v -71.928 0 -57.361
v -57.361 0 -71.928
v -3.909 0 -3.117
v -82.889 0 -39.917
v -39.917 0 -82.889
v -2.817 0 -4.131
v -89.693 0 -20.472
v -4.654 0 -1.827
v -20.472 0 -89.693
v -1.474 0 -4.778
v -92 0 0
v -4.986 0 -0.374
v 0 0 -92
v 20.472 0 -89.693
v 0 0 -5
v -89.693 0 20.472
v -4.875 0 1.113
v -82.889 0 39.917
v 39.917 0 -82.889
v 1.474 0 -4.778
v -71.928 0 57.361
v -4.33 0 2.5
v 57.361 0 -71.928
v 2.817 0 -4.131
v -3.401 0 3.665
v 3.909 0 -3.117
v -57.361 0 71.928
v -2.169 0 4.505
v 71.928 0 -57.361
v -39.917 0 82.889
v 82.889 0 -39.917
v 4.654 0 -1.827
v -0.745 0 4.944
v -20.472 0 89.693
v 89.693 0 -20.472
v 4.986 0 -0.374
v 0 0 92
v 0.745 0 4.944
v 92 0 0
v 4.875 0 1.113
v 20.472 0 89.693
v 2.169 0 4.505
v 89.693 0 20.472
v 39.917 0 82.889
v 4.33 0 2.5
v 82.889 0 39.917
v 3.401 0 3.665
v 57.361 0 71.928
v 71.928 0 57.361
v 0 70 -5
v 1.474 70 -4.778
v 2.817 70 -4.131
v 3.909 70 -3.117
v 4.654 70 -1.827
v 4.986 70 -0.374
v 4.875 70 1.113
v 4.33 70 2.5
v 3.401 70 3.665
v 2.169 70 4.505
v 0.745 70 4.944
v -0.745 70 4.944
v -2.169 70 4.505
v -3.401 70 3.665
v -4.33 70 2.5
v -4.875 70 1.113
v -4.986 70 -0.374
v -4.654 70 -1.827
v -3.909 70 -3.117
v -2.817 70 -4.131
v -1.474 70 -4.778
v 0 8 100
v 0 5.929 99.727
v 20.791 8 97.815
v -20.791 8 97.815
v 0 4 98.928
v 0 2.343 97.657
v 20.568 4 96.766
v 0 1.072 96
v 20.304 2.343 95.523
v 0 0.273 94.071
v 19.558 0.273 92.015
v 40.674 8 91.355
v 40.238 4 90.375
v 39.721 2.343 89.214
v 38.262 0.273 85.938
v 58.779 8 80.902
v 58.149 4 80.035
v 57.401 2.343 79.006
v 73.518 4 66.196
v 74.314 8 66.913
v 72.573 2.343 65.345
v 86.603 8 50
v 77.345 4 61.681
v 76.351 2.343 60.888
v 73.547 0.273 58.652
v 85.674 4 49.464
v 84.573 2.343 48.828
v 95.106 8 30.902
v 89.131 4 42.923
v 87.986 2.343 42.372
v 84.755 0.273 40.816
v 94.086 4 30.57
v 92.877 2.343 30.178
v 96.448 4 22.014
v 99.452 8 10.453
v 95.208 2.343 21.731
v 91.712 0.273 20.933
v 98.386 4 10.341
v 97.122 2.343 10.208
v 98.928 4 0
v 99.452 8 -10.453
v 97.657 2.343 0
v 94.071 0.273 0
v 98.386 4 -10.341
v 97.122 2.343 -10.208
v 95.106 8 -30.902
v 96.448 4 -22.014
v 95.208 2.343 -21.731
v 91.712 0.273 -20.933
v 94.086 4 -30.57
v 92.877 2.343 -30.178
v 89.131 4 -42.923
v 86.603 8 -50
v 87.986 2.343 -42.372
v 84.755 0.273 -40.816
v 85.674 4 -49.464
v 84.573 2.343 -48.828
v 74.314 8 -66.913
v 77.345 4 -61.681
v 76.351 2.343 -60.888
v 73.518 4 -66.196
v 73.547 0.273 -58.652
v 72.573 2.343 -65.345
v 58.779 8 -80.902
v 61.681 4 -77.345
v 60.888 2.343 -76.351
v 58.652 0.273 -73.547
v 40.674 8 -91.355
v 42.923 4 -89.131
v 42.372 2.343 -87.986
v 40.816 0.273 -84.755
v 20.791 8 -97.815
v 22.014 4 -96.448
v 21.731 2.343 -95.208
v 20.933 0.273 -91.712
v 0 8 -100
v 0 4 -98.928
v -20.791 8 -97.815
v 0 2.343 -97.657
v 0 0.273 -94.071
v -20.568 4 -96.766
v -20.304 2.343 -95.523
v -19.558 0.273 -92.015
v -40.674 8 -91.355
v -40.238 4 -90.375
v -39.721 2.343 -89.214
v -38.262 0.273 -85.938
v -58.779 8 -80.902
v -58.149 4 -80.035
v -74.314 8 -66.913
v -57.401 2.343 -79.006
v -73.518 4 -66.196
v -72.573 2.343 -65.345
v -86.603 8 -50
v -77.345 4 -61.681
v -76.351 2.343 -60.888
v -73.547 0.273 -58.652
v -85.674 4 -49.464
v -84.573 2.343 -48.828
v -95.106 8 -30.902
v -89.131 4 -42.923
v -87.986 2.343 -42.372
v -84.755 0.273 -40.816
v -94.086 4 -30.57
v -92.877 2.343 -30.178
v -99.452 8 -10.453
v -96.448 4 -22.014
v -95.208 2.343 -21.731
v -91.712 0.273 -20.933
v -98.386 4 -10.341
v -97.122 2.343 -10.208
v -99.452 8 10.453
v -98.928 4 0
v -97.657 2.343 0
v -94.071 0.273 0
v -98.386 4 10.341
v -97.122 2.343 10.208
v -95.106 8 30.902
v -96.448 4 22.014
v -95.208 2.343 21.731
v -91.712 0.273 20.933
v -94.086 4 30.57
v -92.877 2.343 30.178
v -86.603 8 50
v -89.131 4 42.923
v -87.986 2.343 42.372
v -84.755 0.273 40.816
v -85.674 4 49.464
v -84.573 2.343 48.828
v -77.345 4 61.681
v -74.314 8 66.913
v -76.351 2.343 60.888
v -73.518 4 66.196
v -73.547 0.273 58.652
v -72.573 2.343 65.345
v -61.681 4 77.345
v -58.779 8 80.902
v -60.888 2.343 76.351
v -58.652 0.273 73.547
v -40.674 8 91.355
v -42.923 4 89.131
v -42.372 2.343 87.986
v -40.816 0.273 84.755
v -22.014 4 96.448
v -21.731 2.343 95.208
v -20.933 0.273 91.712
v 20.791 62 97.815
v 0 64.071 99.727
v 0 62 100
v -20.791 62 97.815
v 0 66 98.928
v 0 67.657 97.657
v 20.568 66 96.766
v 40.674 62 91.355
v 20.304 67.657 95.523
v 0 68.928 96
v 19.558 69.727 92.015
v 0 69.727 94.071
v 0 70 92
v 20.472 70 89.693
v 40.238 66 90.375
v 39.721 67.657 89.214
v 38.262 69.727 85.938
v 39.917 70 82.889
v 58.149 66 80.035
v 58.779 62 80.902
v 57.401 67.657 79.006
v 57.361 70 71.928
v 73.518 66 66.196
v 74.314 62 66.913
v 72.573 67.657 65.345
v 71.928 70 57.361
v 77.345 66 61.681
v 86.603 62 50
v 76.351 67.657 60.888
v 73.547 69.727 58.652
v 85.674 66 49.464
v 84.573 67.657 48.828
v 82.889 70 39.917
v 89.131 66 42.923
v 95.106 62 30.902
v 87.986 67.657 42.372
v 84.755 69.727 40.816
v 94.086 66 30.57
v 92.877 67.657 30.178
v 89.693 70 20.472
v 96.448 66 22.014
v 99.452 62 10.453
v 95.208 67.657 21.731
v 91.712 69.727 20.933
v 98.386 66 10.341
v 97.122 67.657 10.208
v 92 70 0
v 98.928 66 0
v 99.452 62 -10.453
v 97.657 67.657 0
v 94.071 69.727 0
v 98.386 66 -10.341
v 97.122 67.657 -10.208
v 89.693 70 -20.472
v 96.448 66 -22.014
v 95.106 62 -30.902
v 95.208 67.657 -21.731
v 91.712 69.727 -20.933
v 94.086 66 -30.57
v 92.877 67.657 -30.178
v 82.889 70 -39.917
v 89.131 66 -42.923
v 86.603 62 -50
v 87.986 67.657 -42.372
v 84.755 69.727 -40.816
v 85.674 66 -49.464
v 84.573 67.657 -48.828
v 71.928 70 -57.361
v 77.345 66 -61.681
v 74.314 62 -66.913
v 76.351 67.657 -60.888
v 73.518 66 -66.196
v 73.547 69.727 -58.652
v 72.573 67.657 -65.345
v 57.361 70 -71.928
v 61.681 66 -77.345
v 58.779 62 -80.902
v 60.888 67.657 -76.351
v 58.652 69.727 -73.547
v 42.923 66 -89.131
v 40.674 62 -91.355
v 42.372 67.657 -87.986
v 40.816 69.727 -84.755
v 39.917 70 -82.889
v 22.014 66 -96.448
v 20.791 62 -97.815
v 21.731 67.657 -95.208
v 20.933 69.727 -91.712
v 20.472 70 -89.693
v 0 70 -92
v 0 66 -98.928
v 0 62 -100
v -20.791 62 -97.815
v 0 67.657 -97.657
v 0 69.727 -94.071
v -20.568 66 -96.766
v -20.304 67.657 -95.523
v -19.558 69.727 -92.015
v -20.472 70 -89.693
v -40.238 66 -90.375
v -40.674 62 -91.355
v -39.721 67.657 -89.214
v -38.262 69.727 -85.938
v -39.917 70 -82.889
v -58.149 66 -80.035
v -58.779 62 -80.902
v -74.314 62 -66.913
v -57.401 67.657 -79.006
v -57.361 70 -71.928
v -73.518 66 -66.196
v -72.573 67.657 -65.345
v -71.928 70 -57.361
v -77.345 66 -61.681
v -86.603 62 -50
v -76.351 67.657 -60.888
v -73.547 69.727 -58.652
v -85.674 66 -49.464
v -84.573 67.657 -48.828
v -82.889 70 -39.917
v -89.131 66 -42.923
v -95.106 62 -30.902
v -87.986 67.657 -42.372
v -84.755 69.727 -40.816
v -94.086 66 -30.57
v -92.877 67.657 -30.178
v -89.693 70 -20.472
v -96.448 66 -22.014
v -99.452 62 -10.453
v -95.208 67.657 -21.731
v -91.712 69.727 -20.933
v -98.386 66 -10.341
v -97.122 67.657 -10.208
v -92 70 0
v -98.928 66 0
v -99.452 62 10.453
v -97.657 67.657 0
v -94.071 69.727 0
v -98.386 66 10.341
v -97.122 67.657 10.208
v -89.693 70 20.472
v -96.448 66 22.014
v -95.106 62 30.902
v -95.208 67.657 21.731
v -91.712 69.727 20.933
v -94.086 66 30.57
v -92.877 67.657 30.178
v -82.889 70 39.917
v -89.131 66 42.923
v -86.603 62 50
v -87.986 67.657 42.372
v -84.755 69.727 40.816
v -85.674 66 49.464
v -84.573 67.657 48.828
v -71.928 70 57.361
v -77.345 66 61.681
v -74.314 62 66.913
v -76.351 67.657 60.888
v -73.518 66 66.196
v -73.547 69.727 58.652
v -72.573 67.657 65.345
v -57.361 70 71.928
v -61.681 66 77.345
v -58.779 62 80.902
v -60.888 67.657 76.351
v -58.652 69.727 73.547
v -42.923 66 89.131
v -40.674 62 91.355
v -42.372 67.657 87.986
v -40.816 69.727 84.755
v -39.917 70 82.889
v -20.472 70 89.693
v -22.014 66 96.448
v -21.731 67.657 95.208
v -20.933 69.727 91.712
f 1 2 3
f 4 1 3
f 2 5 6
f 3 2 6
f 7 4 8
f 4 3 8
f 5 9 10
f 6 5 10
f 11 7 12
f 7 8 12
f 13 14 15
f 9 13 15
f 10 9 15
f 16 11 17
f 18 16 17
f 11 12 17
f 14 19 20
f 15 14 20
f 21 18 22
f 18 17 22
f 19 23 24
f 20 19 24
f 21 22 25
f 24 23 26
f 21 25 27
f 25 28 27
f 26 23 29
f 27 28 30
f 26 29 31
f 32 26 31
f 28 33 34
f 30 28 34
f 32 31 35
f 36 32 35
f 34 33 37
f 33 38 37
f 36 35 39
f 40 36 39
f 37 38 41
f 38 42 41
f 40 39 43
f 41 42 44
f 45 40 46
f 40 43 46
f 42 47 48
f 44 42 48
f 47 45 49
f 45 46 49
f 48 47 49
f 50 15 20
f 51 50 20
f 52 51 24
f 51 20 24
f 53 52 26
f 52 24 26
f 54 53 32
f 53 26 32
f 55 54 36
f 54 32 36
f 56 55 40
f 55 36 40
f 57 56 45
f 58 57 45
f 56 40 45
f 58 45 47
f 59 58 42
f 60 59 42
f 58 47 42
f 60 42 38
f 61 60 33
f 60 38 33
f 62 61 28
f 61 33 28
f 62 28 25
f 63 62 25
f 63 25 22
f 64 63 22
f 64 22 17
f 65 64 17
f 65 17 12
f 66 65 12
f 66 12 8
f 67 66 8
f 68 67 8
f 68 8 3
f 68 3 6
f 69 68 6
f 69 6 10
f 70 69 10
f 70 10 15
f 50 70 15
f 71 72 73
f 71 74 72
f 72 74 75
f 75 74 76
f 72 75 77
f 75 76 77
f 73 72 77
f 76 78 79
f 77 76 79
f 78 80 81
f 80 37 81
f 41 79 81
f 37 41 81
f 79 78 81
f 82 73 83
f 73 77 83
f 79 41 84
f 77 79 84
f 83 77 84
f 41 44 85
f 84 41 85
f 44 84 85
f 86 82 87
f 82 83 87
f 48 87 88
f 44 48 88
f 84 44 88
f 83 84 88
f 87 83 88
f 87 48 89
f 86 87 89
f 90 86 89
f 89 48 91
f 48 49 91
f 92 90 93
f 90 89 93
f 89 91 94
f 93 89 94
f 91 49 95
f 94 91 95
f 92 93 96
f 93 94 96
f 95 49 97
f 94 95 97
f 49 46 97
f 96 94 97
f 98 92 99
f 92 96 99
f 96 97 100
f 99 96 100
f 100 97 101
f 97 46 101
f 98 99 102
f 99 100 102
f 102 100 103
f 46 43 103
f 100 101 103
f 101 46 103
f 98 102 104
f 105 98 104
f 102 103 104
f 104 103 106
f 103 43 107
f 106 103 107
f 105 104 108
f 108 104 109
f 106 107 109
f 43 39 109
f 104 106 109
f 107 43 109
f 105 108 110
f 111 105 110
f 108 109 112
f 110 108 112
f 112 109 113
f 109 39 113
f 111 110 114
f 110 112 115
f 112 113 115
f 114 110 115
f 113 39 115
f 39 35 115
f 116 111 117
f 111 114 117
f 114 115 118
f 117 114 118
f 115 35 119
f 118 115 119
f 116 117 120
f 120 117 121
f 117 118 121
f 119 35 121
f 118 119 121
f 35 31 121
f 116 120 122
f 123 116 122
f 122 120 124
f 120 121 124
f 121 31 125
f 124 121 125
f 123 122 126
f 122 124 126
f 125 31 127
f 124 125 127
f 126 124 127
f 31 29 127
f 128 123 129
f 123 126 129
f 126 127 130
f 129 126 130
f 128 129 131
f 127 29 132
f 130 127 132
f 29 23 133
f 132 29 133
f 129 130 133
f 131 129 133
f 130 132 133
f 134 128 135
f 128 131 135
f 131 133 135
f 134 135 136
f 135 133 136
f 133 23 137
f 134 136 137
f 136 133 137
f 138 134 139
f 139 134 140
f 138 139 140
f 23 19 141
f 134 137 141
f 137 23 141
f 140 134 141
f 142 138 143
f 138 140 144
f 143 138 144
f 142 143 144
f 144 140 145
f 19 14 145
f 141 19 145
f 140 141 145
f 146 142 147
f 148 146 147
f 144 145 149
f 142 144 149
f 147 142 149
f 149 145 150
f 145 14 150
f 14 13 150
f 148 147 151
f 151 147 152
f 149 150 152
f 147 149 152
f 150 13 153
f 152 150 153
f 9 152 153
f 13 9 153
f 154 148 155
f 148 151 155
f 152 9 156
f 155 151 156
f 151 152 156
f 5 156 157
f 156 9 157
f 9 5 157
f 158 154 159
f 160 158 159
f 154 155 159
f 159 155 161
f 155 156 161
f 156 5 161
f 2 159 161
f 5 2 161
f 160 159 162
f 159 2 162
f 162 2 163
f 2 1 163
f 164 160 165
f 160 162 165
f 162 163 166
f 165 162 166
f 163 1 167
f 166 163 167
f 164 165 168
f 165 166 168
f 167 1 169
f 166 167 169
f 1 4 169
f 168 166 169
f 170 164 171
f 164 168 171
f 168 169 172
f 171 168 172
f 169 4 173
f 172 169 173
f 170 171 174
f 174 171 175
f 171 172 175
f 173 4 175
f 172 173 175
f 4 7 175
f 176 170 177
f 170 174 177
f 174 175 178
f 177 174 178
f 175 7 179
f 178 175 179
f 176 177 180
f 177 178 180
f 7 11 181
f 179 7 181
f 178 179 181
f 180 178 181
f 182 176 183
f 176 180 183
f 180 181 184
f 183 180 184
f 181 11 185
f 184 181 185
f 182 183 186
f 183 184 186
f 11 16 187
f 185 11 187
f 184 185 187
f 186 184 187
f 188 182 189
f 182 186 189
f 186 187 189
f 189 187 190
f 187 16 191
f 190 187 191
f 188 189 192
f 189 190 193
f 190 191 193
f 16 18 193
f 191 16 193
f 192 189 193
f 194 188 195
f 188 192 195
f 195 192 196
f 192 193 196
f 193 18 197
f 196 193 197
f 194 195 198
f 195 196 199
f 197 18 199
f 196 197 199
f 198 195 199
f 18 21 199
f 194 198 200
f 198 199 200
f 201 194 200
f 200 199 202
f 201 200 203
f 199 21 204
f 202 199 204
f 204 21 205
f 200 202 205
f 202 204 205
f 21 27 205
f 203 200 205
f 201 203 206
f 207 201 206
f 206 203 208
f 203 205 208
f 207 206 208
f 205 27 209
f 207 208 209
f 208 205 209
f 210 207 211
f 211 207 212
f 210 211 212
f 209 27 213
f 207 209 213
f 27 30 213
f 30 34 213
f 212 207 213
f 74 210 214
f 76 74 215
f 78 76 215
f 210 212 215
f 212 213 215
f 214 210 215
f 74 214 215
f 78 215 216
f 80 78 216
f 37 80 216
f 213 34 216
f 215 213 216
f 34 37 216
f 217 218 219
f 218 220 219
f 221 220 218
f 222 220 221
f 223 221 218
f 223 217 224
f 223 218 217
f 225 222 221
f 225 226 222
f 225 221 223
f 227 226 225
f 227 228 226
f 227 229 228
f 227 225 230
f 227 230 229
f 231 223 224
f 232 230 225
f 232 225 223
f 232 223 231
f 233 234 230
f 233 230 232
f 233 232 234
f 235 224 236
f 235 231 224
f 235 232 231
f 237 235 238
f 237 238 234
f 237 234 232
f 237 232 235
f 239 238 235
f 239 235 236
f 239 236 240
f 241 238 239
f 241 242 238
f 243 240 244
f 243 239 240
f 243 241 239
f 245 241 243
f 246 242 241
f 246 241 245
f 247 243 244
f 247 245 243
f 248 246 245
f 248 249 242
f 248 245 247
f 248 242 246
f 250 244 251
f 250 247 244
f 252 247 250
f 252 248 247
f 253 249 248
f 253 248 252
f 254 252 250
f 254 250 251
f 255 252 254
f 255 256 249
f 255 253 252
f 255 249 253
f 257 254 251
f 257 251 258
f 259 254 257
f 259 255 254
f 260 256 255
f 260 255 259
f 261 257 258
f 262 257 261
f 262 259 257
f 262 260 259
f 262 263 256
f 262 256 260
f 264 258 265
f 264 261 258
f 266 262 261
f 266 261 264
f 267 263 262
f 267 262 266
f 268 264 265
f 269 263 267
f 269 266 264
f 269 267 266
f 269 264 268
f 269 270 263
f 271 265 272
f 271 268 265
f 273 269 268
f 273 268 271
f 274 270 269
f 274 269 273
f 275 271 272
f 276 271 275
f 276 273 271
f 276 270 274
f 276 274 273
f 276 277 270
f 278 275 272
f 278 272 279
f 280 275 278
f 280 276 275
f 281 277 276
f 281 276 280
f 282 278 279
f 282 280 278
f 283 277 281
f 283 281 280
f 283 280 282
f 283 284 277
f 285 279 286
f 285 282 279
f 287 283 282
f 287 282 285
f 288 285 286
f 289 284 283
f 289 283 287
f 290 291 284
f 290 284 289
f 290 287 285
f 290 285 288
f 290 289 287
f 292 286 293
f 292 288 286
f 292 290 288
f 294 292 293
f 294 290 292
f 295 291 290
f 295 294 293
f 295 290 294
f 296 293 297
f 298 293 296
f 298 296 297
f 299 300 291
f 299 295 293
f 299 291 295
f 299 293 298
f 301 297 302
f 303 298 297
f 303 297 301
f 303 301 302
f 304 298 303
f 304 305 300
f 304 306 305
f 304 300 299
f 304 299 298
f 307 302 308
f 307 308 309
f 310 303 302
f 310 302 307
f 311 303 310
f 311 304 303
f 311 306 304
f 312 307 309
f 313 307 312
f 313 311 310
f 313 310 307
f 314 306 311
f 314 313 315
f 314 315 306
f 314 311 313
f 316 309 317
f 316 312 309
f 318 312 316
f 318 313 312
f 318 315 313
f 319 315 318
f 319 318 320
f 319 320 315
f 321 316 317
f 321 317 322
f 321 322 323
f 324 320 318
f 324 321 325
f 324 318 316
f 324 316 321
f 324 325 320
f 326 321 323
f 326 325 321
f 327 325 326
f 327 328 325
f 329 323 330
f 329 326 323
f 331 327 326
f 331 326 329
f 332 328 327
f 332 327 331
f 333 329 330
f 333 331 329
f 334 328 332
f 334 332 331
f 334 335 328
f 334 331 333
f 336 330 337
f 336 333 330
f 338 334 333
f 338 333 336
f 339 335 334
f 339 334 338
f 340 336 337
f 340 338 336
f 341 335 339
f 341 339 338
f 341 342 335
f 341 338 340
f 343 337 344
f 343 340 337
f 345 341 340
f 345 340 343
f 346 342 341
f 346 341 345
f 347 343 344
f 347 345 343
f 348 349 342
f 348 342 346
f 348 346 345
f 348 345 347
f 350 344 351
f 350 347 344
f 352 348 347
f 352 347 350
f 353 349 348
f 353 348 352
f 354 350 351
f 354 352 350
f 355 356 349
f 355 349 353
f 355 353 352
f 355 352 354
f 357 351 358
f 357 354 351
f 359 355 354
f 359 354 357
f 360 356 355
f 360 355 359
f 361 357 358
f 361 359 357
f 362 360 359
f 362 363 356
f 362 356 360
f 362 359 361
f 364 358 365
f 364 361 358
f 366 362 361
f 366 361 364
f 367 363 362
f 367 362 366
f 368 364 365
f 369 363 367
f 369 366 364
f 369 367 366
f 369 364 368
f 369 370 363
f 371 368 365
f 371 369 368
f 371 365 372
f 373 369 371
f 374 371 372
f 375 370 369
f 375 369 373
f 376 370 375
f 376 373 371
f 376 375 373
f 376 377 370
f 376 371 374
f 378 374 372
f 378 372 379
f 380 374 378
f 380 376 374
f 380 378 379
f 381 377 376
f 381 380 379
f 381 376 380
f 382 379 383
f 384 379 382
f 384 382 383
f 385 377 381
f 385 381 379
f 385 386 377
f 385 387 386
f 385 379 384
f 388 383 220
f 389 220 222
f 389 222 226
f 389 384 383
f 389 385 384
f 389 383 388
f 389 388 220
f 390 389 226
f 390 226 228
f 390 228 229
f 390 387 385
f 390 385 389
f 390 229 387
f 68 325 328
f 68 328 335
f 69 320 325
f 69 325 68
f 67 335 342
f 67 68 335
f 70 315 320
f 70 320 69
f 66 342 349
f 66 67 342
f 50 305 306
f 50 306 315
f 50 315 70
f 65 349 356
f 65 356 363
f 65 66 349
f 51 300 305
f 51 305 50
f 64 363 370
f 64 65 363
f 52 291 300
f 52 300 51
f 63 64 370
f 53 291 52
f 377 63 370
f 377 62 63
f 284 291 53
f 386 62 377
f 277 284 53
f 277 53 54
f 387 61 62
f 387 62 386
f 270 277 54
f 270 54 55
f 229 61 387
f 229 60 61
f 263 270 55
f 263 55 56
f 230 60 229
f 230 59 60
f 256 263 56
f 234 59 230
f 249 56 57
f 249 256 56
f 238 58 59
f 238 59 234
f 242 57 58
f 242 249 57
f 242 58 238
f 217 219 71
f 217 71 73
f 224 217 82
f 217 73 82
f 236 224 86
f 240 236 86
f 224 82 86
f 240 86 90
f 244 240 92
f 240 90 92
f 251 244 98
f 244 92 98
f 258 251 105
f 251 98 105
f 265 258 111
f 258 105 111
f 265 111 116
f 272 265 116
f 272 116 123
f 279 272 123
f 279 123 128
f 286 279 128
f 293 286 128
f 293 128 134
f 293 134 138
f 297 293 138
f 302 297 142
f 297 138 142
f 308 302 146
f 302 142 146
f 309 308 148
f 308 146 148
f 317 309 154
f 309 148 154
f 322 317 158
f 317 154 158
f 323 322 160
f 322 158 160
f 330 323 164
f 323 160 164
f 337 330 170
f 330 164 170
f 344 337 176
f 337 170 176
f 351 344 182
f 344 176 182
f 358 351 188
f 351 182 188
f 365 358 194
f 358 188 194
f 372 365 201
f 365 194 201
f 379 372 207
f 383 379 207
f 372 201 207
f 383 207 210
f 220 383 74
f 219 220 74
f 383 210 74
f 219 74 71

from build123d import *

# Parameters (mm, degrees)
SKETCH_1_R          = 100
EXTRUDE_1_DEPTH     = 70
FILLET_1_R          = 8
SKETCH_2_R          = 5
CUT_EXTRUDE_1_DEPTH = 158.797338444


with BuildPart() as part:
    # 草图1 → 凸台-拉伸1 (new body)
    with BuildSketch(Plane(origin=(0, 0, 0), x_dir=(1, 0, 0), z_dir=(0, 1, 0))):
        with Locations(Location((0, 0, 0), (0, 0, 270))):
            Circle(SKETCH_1_R)
    extrude(amount=EXTRUDE_1_DEPTH)

    # 圆角1
    fillet_1_edges = [part.edges().sort_by_distance(p)[0] for p in [
        (0, 0, -100),
        (0, 70, -100),
    ]]
    fillet(fillet_1_edges, radius=FILLET_1_R)

    # 草图2 → 切除-拉伸1 (cut, through all)
    with BuildSketch(Plane.XZ):
        with Locations(Location((0, 0, 0), (0, 0, 270))):
            Circle(SKETCH_2_R)
    extrude(amount=-CUT_EXTRUDE_1_DEPTH, mode=Mode.SUBTRACT)


solid = part.part
